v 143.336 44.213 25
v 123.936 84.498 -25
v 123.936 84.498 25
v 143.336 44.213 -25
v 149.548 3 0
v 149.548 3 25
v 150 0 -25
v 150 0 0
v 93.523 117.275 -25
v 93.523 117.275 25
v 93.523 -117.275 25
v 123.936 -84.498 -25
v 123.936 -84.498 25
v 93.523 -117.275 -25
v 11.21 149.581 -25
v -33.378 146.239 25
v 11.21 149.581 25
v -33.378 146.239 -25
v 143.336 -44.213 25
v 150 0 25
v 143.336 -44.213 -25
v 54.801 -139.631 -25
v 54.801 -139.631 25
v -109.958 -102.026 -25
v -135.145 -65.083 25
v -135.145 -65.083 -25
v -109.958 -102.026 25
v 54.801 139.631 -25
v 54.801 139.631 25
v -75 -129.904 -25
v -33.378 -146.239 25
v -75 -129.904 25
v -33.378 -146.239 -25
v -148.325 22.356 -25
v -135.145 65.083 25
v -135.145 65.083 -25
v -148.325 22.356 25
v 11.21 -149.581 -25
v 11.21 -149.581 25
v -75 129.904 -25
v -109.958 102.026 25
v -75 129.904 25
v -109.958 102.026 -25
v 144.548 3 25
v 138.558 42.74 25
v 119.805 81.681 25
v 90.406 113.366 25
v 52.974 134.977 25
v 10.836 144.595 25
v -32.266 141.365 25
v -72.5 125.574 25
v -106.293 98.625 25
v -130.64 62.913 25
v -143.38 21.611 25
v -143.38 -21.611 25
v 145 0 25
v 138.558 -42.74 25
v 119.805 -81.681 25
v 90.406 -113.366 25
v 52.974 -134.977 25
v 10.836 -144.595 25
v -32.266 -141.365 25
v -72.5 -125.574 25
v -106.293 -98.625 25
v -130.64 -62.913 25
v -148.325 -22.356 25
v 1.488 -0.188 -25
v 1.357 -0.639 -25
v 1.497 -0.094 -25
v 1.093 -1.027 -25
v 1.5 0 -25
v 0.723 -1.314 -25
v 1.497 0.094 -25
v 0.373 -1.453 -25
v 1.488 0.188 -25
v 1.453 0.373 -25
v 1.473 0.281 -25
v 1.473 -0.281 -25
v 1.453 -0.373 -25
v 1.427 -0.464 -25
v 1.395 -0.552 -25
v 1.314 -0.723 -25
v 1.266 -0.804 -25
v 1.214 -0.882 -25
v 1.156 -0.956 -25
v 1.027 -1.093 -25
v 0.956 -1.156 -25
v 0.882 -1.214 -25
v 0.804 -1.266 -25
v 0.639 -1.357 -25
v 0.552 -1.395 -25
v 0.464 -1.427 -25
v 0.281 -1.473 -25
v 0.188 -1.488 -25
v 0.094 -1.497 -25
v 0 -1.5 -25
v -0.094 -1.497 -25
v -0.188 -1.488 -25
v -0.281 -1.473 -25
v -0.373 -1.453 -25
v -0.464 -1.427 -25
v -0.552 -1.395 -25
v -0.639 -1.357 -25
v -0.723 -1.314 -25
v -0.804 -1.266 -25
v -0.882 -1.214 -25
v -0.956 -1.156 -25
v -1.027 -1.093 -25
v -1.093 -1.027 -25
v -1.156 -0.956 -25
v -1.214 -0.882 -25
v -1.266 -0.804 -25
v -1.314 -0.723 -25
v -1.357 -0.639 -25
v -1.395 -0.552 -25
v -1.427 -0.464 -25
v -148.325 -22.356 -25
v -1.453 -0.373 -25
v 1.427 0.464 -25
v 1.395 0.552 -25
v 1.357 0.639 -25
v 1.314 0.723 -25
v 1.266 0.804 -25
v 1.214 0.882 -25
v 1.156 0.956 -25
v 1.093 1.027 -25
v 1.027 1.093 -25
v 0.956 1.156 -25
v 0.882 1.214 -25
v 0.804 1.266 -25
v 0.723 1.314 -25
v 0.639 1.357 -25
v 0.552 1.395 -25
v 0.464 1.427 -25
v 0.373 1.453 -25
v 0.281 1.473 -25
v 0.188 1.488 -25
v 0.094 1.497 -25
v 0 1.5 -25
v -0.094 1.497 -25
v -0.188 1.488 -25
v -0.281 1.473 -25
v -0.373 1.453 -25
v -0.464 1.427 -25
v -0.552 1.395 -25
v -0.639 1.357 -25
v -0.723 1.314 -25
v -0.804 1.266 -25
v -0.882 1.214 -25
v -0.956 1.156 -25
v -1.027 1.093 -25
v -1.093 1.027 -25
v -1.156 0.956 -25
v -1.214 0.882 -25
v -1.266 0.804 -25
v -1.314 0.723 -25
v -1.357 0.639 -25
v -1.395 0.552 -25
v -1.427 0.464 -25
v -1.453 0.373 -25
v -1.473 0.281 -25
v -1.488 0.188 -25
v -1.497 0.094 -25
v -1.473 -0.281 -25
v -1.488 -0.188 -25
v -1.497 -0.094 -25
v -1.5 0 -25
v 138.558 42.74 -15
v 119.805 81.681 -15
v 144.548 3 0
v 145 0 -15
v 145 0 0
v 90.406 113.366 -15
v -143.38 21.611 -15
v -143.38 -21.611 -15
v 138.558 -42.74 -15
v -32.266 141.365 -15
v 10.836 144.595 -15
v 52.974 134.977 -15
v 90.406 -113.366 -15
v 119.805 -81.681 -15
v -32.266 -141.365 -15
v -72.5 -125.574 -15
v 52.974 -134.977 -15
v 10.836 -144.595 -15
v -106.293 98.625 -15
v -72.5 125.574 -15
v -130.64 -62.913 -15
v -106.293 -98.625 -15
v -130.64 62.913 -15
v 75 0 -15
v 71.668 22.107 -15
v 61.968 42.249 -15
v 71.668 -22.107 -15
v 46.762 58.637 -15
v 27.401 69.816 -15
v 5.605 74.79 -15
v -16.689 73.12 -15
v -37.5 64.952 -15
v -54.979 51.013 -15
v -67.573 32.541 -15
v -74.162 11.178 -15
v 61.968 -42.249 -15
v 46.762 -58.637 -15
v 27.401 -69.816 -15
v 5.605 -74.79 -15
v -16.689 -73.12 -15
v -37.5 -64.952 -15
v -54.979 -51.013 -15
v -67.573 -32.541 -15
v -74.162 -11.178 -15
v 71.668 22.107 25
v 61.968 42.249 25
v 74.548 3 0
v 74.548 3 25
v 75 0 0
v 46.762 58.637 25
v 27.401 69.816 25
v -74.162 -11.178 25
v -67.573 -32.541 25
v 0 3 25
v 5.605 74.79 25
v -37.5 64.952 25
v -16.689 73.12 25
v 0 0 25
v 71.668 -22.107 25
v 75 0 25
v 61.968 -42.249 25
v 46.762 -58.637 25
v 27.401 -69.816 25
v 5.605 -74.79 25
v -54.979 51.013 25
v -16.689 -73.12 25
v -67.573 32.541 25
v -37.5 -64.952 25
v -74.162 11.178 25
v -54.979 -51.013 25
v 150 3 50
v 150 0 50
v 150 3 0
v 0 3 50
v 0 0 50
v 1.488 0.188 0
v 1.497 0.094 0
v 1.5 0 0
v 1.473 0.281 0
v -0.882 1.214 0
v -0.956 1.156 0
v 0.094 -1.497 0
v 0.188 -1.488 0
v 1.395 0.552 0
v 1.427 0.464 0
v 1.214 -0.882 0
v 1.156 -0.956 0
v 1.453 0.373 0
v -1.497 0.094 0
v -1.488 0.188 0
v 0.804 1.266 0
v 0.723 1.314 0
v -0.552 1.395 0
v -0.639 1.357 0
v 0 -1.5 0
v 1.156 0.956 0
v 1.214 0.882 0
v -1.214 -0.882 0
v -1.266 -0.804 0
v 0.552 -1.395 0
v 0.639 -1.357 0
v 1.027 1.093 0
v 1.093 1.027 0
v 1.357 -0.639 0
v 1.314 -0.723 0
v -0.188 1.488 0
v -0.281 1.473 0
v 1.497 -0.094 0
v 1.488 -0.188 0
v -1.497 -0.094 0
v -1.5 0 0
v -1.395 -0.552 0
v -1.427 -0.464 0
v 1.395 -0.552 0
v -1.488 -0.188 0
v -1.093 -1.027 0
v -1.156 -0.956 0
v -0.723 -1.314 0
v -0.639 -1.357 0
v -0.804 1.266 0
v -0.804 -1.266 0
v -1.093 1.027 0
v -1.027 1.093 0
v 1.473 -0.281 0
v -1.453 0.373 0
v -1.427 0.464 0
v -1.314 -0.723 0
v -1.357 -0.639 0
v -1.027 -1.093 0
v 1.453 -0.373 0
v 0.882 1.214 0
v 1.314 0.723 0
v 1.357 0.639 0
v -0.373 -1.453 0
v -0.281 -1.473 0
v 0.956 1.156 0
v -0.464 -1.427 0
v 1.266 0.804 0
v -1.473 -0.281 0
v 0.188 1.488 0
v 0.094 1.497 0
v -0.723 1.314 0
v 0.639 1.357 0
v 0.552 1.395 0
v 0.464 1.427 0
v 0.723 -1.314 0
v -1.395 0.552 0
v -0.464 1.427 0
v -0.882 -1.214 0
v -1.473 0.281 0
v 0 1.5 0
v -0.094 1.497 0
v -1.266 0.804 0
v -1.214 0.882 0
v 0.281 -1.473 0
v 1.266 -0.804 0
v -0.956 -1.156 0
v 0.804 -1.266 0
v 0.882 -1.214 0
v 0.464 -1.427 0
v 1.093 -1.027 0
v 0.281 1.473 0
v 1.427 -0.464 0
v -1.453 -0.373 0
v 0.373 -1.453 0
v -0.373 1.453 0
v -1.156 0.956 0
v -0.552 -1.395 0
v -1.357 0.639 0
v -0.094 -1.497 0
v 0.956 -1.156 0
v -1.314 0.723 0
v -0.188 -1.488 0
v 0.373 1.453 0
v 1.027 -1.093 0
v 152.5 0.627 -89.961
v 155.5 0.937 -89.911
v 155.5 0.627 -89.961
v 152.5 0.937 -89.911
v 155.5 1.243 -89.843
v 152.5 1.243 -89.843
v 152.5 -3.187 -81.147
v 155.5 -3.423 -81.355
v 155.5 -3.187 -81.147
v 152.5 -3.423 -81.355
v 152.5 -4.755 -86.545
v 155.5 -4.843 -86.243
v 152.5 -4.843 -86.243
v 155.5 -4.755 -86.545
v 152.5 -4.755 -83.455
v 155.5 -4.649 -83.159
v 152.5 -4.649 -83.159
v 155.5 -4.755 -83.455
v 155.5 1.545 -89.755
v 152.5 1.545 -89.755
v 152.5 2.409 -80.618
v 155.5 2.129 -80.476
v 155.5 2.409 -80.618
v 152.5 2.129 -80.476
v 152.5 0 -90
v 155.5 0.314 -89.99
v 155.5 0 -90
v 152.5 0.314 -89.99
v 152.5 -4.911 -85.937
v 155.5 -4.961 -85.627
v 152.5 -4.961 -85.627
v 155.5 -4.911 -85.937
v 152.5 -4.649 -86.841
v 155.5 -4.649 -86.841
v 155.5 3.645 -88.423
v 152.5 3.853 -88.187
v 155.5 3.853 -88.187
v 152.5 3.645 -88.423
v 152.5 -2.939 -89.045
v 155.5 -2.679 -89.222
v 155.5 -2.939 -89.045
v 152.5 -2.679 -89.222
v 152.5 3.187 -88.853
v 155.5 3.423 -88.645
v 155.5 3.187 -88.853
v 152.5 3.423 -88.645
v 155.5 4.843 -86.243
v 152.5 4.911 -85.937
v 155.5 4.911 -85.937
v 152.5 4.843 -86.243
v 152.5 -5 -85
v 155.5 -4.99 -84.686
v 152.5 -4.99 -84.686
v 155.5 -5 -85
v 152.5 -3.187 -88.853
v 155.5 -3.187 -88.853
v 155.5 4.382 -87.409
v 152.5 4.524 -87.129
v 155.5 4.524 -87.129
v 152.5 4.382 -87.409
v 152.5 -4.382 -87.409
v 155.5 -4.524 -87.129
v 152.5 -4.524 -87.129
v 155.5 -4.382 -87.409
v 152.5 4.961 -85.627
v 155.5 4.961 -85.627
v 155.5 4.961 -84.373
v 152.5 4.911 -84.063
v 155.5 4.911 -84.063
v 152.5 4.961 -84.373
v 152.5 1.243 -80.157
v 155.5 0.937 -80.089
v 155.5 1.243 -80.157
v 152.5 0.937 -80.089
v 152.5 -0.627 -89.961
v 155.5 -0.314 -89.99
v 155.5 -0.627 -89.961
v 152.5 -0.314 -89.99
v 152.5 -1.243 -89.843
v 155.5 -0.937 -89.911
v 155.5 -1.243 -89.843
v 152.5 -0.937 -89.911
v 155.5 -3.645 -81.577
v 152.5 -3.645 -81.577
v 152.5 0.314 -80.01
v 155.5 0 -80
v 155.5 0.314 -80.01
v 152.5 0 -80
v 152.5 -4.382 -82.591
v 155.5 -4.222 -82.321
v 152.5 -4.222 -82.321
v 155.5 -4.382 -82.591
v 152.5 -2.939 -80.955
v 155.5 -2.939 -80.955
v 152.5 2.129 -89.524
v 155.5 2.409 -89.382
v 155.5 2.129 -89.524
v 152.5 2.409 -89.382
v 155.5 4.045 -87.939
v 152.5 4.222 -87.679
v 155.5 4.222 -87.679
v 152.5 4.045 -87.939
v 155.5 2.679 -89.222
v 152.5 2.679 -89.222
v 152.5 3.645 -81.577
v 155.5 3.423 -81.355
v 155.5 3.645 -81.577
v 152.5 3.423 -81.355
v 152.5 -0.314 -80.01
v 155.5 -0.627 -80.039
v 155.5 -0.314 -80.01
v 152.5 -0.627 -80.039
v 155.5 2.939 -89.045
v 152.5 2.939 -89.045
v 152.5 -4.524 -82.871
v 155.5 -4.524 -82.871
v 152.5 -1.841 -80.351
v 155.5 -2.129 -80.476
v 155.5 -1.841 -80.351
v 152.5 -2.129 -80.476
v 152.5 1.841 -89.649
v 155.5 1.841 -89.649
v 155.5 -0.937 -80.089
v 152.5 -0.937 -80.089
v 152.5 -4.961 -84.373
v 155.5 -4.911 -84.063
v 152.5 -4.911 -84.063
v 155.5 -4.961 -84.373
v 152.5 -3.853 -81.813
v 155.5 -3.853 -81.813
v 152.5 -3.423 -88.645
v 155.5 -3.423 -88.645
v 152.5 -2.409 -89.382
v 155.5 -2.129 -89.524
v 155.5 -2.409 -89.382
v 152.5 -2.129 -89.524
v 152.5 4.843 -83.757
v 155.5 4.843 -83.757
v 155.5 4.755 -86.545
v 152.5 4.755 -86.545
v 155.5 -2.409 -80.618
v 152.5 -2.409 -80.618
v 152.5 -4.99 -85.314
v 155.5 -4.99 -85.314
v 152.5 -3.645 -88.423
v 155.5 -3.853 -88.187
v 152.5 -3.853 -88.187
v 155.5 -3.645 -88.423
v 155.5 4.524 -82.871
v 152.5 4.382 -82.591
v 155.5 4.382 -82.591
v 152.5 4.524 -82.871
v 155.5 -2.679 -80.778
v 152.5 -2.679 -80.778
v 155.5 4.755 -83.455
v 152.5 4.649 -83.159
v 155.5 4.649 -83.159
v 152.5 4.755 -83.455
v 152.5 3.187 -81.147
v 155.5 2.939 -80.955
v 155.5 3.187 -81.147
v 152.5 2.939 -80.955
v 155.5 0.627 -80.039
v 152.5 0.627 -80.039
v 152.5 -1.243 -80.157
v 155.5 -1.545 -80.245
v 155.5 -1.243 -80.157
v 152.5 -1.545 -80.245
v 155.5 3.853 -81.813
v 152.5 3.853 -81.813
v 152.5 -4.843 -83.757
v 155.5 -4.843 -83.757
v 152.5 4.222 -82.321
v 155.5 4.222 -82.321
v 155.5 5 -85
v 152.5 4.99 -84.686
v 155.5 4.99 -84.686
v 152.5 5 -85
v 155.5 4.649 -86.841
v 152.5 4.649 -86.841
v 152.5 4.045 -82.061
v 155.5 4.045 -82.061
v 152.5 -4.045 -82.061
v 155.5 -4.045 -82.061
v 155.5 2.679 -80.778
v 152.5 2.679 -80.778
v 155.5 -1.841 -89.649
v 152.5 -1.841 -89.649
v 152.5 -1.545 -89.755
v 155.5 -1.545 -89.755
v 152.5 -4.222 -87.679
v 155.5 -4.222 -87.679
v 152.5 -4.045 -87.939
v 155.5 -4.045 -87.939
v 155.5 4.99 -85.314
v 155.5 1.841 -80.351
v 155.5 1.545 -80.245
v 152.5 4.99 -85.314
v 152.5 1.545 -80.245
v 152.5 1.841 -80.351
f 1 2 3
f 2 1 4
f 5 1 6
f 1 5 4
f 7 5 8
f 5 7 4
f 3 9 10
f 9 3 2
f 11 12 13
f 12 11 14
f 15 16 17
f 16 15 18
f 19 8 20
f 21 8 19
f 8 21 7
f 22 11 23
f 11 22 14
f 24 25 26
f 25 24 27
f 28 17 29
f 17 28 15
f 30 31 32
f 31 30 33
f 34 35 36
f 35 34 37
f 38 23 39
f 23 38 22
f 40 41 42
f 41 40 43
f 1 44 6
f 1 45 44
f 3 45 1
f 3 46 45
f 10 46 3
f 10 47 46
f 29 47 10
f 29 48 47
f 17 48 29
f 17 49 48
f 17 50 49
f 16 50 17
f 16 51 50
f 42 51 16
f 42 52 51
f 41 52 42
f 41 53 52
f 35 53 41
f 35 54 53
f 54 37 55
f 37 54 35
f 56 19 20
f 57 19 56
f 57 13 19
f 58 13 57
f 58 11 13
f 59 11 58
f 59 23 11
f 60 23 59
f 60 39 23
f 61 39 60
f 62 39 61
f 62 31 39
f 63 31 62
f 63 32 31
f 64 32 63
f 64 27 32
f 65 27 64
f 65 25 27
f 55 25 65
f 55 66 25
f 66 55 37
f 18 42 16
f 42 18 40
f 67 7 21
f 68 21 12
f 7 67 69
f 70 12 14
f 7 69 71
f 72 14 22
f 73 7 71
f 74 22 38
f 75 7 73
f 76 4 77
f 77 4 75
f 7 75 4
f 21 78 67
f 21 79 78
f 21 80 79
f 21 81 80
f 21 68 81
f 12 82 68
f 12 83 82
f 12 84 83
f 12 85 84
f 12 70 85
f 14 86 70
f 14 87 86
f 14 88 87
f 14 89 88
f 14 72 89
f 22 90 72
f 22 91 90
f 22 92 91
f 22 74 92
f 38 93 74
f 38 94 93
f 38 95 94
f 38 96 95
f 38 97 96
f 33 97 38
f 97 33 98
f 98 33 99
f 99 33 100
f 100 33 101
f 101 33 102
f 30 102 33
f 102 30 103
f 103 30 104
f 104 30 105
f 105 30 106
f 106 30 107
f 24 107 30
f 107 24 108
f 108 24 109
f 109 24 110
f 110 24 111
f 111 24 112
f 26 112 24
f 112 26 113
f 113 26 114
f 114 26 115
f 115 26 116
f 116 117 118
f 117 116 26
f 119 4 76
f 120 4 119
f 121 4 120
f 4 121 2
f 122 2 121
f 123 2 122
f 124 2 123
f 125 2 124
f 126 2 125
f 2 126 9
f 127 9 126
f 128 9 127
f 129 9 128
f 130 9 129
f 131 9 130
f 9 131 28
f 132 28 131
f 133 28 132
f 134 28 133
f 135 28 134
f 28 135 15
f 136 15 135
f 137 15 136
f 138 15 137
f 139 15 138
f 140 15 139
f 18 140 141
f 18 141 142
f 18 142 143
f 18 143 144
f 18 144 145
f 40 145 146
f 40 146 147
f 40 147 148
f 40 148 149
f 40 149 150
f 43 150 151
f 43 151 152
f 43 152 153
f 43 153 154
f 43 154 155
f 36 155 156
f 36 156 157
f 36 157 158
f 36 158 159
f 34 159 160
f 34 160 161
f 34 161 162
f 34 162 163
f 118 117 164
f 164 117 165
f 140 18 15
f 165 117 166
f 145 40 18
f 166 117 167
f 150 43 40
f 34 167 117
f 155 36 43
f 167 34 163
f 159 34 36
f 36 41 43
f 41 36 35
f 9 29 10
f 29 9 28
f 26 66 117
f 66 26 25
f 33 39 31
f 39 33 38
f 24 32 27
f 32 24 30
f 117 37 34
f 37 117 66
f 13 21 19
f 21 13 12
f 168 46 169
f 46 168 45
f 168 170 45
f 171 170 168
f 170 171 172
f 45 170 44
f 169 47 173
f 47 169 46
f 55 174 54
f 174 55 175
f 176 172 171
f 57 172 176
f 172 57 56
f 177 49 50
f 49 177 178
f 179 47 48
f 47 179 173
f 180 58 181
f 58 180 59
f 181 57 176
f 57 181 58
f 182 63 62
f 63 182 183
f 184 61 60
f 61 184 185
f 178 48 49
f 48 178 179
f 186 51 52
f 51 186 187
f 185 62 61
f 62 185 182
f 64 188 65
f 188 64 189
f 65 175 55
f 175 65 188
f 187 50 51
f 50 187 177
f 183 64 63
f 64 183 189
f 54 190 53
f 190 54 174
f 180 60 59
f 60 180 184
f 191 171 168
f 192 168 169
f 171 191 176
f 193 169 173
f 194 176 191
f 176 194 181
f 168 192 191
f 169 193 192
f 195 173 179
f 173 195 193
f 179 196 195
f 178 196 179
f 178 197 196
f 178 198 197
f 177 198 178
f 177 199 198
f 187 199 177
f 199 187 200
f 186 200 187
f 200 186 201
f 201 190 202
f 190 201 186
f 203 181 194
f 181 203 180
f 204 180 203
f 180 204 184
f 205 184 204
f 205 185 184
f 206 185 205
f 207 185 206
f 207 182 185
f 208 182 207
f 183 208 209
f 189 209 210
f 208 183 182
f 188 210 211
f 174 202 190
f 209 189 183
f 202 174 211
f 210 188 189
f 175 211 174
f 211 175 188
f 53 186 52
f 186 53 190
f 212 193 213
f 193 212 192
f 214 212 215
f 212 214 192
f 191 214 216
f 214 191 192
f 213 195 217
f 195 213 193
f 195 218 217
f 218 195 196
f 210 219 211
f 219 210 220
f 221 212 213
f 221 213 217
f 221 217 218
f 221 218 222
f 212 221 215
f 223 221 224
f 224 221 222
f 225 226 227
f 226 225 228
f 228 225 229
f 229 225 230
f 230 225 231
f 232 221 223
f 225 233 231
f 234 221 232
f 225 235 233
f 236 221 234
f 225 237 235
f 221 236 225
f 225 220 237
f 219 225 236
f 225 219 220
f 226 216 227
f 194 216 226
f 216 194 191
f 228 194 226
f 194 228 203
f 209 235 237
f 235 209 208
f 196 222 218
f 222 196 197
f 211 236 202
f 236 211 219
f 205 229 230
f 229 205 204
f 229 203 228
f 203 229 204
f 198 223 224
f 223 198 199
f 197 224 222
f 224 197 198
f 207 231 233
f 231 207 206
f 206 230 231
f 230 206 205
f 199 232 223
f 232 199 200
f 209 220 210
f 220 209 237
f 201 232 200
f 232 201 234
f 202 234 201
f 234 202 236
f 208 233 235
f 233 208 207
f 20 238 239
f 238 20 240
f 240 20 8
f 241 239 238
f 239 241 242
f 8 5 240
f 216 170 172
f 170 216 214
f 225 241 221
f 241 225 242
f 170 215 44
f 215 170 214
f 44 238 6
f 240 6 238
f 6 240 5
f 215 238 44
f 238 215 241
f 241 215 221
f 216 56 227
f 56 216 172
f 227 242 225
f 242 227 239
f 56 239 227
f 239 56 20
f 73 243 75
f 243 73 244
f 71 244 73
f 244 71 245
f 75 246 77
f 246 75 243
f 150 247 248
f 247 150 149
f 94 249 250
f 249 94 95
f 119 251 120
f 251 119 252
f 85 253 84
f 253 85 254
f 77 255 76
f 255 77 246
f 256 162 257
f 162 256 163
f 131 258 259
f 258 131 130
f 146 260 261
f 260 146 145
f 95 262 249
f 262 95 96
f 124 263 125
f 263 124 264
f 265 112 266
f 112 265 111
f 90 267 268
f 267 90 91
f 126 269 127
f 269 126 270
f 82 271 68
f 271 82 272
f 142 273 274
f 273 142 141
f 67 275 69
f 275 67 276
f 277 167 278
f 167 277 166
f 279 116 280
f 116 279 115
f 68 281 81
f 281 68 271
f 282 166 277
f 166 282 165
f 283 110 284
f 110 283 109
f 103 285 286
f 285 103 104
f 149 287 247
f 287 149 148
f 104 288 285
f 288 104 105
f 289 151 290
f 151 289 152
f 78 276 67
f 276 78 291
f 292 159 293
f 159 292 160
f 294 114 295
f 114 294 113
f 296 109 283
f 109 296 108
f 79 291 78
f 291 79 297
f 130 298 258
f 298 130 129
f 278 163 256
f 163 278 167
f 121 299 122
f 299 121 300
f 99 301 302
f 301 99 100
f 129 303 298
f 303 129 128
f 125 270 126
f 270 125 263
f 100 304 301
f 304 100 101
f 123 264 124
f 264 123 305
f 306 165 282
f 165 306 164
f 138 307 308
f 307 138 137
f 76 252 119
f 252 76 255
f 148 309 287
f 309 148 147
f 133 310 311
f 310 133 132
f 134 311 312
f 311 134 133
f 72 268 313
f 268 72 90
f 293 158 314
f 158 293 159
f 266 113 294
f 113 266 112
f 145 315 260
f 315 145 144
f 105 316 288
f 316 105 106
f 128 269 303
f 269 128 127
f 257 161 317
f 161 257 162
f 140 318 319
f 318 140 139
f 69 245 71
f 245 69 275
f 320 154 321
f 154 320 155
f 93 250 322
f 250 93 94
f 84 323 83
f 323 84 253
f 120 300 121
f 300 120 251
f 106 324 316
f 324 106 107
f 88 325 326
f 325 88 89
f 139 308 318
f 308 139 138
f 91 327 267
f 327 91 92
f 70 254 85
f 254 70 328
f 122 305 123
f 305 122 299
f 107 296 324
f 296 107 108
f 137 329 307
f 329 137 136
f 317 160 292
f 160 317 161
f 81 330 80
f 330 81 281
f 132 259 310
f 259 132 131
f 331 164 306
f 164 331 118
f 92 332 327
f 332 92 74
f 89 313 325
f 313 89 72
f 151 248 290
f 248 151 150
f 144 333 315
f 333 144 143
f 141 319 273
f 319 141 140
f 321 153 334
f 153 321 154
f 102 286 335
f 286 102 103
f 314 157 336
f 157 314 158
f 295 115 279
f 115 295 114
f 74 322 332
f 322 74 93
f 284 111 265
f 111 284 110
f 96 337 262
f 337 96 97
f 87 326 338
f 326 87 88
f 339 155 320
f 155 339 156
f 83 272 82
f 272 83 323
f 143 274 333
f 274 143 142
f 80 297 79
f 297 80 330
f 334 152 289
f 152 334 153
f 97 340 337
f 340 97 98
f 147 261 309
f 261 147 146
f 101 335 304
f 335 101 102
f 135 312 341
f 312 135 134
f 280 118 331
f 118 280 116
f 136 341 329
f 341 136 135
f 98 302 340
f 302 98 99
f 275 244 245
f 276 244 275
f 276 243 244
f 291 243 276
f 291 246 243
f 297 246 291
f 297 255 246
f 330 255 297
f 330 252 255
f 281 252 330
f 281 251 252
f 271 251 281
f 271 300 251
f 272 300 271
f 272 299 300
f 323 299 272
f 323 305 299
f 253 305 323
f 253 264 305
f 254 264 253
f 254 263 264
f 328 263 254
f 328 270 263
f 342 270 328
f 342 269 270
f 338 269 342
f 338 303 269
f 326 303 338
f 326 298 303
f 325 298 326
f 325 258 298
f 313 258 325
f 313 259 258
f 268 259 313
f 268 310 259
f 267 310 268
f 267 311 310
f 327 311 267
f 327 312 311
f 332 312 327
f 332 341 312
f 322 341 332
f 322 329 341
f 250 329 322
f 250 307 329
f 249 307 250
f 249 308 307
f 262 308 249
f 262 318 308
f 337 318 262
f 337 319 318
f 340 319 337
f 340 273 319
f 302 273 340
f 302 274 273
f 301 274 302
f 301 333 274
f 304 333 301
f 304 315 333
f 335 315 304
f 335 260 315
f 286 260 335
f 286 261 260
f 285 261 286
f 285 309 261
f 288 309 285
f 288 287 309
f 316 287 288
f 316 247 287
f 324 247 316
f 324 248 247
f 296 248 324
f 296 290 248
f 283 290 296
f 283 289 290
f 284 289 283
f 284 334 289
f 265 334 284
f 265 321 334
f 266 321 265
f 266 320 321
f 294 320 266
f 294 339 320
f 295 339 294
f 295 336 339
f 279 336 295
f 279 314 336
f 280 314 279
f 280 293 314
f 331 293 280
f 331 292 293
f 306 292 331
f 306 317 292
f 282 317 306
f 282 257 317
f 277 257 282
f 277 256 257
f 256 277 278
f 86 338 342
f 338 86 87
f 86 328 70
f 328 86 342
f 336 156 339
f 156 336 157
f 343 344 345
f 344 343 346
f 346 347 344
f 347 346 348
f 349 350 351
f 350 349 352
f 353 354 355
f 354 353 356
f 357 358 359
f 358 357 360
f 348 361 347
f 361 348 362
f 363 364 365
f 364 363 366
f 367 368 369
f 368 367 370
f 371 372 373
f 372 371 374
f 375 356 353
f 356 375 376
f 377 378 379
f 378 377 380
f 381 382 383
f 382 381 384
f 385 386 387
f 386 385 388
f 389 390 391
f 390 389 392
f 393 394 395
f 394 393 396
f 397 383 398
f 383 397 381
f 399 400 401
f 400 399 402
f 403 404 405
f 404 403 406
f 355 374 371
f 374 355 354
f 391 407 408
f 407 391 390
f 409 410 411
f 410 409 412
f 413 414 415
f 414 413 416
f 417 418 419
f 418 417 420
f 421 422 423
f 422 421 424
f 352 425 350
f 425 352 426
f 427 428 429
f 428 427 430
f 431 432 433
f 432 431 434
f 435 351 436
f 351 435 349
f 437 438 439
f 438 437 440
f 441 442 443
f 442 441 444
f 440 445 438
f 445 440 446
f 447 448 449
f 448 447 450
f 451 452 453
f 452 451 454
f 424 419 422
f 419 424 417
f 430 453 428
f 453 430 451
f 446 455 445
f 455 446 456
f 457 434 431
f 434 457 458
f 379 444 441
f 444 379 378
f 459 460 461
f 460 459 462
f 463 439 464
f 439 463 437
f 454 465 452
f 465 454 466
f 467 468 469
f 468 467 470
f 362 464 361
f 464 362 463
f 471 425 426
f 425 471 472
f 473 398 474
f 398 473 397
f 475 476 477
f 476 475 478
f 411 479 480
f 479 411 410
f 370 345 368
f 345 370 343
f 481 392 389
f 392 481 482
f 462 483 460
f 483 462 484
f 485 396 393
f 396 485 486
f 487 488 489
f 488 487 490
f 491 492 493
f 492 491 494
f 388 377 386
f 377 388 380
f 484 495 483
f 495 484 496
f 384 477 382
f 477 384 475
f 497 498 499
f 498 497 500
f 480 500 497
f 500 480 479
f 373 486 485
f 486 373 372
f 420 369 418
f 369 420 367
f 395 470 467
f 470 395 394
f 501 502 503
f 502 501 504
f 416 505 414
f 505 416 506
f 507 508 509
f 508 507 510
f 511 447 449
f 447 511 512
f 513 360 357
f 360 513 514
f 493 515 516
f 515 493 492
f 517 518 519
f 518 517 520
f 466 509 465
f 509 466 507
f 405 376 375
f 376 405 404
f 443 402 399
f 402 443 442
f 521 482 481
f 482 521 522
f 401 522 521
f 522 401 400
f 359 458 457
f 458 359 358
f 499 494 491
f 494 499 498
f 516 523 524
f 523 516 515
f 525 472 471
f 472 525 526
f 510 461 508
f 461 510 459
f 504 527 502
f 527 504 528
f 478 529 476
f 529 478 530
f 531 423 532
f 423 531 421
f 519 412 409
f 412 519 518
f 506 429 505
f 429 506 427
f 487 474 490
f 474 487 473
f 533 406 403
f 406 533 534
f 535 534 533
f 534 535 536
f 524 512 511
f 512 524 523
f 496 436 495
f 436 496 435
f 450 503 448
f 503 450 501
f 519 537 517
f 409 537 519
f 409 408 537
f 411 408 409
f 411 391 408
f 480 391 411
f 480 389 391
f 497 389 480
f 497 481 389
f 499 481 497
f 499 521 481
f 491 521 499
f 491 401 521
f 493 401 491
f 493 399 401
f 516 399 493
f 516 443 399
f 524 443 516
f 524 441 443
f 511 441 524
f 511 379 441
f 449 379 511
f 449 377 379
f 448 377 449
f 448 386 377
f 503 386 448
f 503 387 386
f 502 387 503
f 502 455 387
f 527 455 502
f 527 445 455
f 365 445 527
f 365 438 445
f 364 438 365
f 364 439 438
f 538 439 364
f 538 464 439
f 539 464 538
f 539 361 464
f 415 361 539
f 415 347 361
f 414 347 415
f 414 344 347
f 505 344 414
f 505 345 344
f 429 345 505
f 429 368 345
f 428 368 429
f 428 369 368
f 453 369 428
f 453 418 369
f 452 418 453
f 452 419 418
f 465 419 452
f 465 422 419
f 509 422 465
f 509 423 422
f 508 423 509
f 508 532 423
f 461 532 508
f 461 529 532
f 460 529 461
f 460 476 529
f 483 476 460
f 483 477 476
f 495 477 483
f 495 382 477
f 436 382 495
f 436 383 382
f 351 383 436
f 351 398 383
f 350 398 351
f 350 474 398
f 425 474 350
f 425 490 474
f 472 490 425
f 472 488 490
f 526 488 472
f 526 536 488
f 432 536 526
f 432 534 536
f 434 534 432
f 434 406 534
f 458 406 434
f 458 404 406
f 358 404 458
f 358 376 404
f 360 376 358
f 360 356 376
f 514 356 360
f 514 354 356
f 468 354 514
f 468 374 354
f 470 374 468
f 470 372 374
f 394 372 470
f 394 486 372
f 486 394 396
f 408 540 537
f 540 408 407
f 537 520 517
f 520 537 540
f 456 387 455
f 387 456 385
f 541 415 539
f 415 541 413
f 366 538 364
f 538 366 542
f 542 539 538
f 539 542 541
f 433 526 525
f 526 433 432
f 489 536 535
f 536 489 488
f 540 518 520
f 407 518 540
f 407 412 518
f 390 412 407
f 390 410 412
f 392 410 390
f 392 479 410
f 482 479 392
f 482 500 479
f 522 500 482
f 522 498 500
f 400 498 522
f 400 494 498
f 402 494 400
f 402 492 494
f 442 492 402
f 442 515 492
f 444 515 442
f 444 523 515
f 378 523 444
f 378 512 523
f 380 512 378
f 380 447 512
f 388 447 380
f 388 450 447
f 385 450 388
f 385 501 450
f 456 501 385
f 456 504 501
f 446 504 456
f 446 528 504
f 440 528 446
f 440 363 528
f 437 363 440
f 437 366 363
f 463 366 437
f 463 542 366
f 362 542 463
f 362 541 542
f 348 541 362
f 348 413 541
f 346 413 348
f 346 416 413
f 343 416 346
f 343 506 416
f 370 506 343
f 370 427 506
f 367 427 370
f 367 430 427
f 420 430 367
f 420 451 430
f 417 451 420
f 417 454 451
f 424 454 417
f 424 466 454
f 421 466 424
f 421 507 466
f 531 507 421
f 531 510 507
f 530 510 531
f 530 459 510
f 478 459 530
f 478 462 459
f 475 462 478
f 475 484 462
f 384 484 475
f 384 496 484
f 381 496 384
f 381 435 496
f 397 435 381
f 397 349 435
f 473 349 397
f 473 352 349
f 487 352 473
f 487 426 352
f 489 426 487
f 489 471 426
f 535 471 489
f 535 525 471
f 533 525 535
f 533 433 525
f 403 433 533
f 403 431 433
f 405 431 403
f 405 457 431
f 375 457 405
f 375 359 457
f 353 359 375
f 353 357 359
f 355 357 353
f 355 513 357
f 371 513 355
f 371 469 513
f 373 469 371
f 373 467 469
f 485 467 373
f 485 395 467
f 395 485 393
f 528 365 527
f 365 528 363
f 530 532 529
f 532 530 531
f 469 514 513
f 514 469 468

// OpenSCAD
// file: caja.scad
//ESTE MODULO GENERA UNA CAJA PARA EL PASTILLERO.

use<sector.scad>;
//la caja central para las patillas.
module cajasinhueco (tomasdia=3,
altura=50,
diametro=300,
diametrointerior=150,
grosorlateral=10,
grosorlateralcarcasa=10,
grosorinferiorcarcasa=5,
grosorsuperiorcarcasa=5,
grosorinferior=10,
grosorcajon=3
){

tomassem=tomasdia*7;
angulo=360/tomassem/2;
anguloinic=(tomasdia%2!=0)? angulo: 0;   

module cajitas(
tomasdia=3,
altura=50,
diametro=300,
diametrointerior=150
){
//for(n = [anguloinic : 2*angulo : 360]){    
   echo(0);
   difference(){
        rotate([0,0,0])
        cube([diametro-diametrointerior,grosorcajon,altura]);
        //rotate([0,0,0])
        //translate([diametro/2-grosorlateral,0,0])
        //cube([diametro-grosorlateral,grosorcajon,altura],center=true);
    }
//}
}
difference(){
    cylinder(h=altura,d=diametro,$fn=tomassem, center=true);
    translate([0,0,grosorinferior]){   
    cylinder(h=altura,d=diametro-grosorlateral,$fn=tomassem, center=true);
    }    
}
cylinder(h=altura,d=diametrointerior,$fn=tomassem, center=true);
       cajitas();
}
//la caja, teniendo en cuenta el agujero para el servomotor.
module caja(tomasdia=3,
altura=50,
diametro=300,
diametrointerior=150,
grosorlateral=10,
grosorlateralcarcasa=10,
grosorinferiorcarcasa=5,
grosorsuperiorcarcasa=5,
grosorinferior=10,
grosorcajon=3){

difference(){
    cajasinhueco(tomasdia,
altura,
diametro,
diametrointerior,
grosorlateral,
grosorlateralcarcasa,
grosorinferiorcarcasa,
grosorsuperiorcarcasa,
grosorinferior,
grosorcajon);
    translate([0,0,-25]){
        cylinder(h=50, d=3, $fn=100, center=true);
    }
}
}
//La caja y la cubierta exterior
module cajacubierta(tomasdia=3,
altura=50,
diametro=300,
diametrointerior=150,
grosorlateral=10,
grosorlateralcarcasa=10,
grosorinferiorcarcasa=5,
grosorsuperiorcarcasa=5,
grosorinferior=10,
grosorcajon=3,
hsup=10,
hinf=20,
hlat=7,
gsup=3,
ginf=3,
glat=3
){  
    alturacajaExt=altura+hsup+gsup+hinf+ginf;
    alturacajaInt=altura+hsup+hinf;
    desplazamiento=hinf-(alturacajaInt-altura)/2;
    translate([0,0,-desplazamiento]){
    difference(){  
        cylinder(h=alturacajaExt, d=diametro+hlat+glat, $fn=100, center=true);
        cylinder(h=alturacajaInt,d=diametro+hlat, $fn=100, center=true);    
    }
    } 
caja(tomasdia,
altura,
diametro,
diametrointerior,
grosorlateral,
grosorlateralcarcasa,
grosorinferiorcarcasa,
grosorsuperiorcarcasa,
grosorinferior,
grosorcajon);
}
//%cajacubierta();
//Caja con una apertura para coger la pastilla y con un agujero para la alimentación 
module cajaAlimTapa(tomasdia=3,
altura=50,
diametro=300,
diametrointerior=150,
grosorlateral=10,
grosorlateralcarcasa=10,
grosorinferiorcarcasa=5,
grosorsuperiorcarcasa=5,
grosorinferior=10,
grosorcajon=3,
hsup=10,
hinf=20,
hlat=7,
gsup=3,
ginf=3,
glat=3,
anguloTapa1=170,
anguloTapa2=190,
diametroalim=10,
alturaalim=10
){
  module tapa(){
   difference(){
    translate([0,0,altura*0.5+hsup]){
    sector(h=gsup, d=diametro, a1=anguloTapa1, a2=anguloTapa2,$fn=100, centre=true);   
    }    
    translate([0,0,altura*0.5+hsup]){
    sector(h=gsup, d=diametrointerior, a1=anguloTapa1, a2=anguloTapa2, $fn=100, centre=true);
   }     
}
}
    alturacajaInt=altura+hsup+hinf;
    desplazamientoAlim=alturacajaInt/2-alturaalim;
    echo(alturacajaInt/2);
    echo(desplazamientoAlim);
    
difference(){
            cajacubierta(tomasdia,
            altura,
            diametro,
            diametrointerior,
            grosorlateral,
            grosorlateralcarcasa,
            grosorinferiorcarcasa,
            grosorsuperiorcarcasa,
            grosorinferior,
            grosorcajon,
            hsup,
            hinf,
            hlat,
            gsup,
            ginf,
            glat
            );
            translate([(diametro+hlat/2)/2,0, -desplazamientoAlim])
            rotate(a=[0,90,0])
            cylinder(h=glat*2, d=diametroalim, $fn=100, centre=true); 
            tapa();
}
}
cajaAlimTapa();
// file: sector.scad
translate([0,0,0]) sector(30, 20, 10, 90);
translate([22,0,0]) sector(30, 20, 300, 30);
translate([0,22,0]) sector(30, 20, 30, 300);
translate([22,22,0]) sector(30, 20, 10, 190);

module sector(h, d, a1, a2) {
    if (a2 - a1 > 180) {
        difference() {
            cylinder(h=h, d=d);
            translate([0,0,-0.5]) sector(h+1, d+1, a2-360, a1); 
        }
    } else {
        difference() {
            cylinder(h=h, d=d);
            rotate([0,0,a1]) translate([-d/2, -d/2, -0.5])
                cube([d, d/2, h+1]);
            rotate([0,0,a2]) translate([-d/2, 0, -0.5])
                cube([d, d/2, h+1]);
        }
    }
}    
// main file
use<sector.scad>;
use<caja.scad>;
diametro=300;
diametrointerior=150;
altura=50;
gsup=3;
hsup=10;
diametroalim=10;
glat=3;
hlat=7;

module exoesqueleto(
hsup=10,
hinf=50,
hlat=7,
gsup=3,
ginf=3,
glat=3
){   
    difference(){
    translate([0,0,hsup+gsup])    
        cylinder(h=altura, d=diametro+hlat+glat, $fn=100, center=true);
    translate([0,0,hsup])    
        cylinder(h=altura,d=diametro+hlat, $fn=100, center=true);    
    } 
    difference(){
    translate([0,0,-hinf-ginf])    
        cylinder(h=altura*1.8, d=diametro+hlat+glat, $fn=100, center=true);
    translate([0,0,-hinf])    
        cylinder(h=altura*1.8,d=diametro+hlat, $fn=100, center=true);    
    }

}

module tapa(){
   difference(){
    translate([0,0,altura*0.5+hsup]){
    sector(h=gsup, d=diametro, a1=170, a2=190,$fn=100, centre=true);   
    }    
    translate([0,0,altura*0.5+hsup]){
    sector(h=gsup, d=diametrointerior, a1=170, a2=190, $fn=100, centre=true);
   }     
}
}
caja();
difference(){
%exoesqueleto();
        translate([(diametro+hlat/2+glat/2)/2,0,-altura*1.7])
        rotate(a=[0,90,0])
        cylinder(h=glat, d=diametroalim, $fn=100, centre=true); 
tapa();
}    
